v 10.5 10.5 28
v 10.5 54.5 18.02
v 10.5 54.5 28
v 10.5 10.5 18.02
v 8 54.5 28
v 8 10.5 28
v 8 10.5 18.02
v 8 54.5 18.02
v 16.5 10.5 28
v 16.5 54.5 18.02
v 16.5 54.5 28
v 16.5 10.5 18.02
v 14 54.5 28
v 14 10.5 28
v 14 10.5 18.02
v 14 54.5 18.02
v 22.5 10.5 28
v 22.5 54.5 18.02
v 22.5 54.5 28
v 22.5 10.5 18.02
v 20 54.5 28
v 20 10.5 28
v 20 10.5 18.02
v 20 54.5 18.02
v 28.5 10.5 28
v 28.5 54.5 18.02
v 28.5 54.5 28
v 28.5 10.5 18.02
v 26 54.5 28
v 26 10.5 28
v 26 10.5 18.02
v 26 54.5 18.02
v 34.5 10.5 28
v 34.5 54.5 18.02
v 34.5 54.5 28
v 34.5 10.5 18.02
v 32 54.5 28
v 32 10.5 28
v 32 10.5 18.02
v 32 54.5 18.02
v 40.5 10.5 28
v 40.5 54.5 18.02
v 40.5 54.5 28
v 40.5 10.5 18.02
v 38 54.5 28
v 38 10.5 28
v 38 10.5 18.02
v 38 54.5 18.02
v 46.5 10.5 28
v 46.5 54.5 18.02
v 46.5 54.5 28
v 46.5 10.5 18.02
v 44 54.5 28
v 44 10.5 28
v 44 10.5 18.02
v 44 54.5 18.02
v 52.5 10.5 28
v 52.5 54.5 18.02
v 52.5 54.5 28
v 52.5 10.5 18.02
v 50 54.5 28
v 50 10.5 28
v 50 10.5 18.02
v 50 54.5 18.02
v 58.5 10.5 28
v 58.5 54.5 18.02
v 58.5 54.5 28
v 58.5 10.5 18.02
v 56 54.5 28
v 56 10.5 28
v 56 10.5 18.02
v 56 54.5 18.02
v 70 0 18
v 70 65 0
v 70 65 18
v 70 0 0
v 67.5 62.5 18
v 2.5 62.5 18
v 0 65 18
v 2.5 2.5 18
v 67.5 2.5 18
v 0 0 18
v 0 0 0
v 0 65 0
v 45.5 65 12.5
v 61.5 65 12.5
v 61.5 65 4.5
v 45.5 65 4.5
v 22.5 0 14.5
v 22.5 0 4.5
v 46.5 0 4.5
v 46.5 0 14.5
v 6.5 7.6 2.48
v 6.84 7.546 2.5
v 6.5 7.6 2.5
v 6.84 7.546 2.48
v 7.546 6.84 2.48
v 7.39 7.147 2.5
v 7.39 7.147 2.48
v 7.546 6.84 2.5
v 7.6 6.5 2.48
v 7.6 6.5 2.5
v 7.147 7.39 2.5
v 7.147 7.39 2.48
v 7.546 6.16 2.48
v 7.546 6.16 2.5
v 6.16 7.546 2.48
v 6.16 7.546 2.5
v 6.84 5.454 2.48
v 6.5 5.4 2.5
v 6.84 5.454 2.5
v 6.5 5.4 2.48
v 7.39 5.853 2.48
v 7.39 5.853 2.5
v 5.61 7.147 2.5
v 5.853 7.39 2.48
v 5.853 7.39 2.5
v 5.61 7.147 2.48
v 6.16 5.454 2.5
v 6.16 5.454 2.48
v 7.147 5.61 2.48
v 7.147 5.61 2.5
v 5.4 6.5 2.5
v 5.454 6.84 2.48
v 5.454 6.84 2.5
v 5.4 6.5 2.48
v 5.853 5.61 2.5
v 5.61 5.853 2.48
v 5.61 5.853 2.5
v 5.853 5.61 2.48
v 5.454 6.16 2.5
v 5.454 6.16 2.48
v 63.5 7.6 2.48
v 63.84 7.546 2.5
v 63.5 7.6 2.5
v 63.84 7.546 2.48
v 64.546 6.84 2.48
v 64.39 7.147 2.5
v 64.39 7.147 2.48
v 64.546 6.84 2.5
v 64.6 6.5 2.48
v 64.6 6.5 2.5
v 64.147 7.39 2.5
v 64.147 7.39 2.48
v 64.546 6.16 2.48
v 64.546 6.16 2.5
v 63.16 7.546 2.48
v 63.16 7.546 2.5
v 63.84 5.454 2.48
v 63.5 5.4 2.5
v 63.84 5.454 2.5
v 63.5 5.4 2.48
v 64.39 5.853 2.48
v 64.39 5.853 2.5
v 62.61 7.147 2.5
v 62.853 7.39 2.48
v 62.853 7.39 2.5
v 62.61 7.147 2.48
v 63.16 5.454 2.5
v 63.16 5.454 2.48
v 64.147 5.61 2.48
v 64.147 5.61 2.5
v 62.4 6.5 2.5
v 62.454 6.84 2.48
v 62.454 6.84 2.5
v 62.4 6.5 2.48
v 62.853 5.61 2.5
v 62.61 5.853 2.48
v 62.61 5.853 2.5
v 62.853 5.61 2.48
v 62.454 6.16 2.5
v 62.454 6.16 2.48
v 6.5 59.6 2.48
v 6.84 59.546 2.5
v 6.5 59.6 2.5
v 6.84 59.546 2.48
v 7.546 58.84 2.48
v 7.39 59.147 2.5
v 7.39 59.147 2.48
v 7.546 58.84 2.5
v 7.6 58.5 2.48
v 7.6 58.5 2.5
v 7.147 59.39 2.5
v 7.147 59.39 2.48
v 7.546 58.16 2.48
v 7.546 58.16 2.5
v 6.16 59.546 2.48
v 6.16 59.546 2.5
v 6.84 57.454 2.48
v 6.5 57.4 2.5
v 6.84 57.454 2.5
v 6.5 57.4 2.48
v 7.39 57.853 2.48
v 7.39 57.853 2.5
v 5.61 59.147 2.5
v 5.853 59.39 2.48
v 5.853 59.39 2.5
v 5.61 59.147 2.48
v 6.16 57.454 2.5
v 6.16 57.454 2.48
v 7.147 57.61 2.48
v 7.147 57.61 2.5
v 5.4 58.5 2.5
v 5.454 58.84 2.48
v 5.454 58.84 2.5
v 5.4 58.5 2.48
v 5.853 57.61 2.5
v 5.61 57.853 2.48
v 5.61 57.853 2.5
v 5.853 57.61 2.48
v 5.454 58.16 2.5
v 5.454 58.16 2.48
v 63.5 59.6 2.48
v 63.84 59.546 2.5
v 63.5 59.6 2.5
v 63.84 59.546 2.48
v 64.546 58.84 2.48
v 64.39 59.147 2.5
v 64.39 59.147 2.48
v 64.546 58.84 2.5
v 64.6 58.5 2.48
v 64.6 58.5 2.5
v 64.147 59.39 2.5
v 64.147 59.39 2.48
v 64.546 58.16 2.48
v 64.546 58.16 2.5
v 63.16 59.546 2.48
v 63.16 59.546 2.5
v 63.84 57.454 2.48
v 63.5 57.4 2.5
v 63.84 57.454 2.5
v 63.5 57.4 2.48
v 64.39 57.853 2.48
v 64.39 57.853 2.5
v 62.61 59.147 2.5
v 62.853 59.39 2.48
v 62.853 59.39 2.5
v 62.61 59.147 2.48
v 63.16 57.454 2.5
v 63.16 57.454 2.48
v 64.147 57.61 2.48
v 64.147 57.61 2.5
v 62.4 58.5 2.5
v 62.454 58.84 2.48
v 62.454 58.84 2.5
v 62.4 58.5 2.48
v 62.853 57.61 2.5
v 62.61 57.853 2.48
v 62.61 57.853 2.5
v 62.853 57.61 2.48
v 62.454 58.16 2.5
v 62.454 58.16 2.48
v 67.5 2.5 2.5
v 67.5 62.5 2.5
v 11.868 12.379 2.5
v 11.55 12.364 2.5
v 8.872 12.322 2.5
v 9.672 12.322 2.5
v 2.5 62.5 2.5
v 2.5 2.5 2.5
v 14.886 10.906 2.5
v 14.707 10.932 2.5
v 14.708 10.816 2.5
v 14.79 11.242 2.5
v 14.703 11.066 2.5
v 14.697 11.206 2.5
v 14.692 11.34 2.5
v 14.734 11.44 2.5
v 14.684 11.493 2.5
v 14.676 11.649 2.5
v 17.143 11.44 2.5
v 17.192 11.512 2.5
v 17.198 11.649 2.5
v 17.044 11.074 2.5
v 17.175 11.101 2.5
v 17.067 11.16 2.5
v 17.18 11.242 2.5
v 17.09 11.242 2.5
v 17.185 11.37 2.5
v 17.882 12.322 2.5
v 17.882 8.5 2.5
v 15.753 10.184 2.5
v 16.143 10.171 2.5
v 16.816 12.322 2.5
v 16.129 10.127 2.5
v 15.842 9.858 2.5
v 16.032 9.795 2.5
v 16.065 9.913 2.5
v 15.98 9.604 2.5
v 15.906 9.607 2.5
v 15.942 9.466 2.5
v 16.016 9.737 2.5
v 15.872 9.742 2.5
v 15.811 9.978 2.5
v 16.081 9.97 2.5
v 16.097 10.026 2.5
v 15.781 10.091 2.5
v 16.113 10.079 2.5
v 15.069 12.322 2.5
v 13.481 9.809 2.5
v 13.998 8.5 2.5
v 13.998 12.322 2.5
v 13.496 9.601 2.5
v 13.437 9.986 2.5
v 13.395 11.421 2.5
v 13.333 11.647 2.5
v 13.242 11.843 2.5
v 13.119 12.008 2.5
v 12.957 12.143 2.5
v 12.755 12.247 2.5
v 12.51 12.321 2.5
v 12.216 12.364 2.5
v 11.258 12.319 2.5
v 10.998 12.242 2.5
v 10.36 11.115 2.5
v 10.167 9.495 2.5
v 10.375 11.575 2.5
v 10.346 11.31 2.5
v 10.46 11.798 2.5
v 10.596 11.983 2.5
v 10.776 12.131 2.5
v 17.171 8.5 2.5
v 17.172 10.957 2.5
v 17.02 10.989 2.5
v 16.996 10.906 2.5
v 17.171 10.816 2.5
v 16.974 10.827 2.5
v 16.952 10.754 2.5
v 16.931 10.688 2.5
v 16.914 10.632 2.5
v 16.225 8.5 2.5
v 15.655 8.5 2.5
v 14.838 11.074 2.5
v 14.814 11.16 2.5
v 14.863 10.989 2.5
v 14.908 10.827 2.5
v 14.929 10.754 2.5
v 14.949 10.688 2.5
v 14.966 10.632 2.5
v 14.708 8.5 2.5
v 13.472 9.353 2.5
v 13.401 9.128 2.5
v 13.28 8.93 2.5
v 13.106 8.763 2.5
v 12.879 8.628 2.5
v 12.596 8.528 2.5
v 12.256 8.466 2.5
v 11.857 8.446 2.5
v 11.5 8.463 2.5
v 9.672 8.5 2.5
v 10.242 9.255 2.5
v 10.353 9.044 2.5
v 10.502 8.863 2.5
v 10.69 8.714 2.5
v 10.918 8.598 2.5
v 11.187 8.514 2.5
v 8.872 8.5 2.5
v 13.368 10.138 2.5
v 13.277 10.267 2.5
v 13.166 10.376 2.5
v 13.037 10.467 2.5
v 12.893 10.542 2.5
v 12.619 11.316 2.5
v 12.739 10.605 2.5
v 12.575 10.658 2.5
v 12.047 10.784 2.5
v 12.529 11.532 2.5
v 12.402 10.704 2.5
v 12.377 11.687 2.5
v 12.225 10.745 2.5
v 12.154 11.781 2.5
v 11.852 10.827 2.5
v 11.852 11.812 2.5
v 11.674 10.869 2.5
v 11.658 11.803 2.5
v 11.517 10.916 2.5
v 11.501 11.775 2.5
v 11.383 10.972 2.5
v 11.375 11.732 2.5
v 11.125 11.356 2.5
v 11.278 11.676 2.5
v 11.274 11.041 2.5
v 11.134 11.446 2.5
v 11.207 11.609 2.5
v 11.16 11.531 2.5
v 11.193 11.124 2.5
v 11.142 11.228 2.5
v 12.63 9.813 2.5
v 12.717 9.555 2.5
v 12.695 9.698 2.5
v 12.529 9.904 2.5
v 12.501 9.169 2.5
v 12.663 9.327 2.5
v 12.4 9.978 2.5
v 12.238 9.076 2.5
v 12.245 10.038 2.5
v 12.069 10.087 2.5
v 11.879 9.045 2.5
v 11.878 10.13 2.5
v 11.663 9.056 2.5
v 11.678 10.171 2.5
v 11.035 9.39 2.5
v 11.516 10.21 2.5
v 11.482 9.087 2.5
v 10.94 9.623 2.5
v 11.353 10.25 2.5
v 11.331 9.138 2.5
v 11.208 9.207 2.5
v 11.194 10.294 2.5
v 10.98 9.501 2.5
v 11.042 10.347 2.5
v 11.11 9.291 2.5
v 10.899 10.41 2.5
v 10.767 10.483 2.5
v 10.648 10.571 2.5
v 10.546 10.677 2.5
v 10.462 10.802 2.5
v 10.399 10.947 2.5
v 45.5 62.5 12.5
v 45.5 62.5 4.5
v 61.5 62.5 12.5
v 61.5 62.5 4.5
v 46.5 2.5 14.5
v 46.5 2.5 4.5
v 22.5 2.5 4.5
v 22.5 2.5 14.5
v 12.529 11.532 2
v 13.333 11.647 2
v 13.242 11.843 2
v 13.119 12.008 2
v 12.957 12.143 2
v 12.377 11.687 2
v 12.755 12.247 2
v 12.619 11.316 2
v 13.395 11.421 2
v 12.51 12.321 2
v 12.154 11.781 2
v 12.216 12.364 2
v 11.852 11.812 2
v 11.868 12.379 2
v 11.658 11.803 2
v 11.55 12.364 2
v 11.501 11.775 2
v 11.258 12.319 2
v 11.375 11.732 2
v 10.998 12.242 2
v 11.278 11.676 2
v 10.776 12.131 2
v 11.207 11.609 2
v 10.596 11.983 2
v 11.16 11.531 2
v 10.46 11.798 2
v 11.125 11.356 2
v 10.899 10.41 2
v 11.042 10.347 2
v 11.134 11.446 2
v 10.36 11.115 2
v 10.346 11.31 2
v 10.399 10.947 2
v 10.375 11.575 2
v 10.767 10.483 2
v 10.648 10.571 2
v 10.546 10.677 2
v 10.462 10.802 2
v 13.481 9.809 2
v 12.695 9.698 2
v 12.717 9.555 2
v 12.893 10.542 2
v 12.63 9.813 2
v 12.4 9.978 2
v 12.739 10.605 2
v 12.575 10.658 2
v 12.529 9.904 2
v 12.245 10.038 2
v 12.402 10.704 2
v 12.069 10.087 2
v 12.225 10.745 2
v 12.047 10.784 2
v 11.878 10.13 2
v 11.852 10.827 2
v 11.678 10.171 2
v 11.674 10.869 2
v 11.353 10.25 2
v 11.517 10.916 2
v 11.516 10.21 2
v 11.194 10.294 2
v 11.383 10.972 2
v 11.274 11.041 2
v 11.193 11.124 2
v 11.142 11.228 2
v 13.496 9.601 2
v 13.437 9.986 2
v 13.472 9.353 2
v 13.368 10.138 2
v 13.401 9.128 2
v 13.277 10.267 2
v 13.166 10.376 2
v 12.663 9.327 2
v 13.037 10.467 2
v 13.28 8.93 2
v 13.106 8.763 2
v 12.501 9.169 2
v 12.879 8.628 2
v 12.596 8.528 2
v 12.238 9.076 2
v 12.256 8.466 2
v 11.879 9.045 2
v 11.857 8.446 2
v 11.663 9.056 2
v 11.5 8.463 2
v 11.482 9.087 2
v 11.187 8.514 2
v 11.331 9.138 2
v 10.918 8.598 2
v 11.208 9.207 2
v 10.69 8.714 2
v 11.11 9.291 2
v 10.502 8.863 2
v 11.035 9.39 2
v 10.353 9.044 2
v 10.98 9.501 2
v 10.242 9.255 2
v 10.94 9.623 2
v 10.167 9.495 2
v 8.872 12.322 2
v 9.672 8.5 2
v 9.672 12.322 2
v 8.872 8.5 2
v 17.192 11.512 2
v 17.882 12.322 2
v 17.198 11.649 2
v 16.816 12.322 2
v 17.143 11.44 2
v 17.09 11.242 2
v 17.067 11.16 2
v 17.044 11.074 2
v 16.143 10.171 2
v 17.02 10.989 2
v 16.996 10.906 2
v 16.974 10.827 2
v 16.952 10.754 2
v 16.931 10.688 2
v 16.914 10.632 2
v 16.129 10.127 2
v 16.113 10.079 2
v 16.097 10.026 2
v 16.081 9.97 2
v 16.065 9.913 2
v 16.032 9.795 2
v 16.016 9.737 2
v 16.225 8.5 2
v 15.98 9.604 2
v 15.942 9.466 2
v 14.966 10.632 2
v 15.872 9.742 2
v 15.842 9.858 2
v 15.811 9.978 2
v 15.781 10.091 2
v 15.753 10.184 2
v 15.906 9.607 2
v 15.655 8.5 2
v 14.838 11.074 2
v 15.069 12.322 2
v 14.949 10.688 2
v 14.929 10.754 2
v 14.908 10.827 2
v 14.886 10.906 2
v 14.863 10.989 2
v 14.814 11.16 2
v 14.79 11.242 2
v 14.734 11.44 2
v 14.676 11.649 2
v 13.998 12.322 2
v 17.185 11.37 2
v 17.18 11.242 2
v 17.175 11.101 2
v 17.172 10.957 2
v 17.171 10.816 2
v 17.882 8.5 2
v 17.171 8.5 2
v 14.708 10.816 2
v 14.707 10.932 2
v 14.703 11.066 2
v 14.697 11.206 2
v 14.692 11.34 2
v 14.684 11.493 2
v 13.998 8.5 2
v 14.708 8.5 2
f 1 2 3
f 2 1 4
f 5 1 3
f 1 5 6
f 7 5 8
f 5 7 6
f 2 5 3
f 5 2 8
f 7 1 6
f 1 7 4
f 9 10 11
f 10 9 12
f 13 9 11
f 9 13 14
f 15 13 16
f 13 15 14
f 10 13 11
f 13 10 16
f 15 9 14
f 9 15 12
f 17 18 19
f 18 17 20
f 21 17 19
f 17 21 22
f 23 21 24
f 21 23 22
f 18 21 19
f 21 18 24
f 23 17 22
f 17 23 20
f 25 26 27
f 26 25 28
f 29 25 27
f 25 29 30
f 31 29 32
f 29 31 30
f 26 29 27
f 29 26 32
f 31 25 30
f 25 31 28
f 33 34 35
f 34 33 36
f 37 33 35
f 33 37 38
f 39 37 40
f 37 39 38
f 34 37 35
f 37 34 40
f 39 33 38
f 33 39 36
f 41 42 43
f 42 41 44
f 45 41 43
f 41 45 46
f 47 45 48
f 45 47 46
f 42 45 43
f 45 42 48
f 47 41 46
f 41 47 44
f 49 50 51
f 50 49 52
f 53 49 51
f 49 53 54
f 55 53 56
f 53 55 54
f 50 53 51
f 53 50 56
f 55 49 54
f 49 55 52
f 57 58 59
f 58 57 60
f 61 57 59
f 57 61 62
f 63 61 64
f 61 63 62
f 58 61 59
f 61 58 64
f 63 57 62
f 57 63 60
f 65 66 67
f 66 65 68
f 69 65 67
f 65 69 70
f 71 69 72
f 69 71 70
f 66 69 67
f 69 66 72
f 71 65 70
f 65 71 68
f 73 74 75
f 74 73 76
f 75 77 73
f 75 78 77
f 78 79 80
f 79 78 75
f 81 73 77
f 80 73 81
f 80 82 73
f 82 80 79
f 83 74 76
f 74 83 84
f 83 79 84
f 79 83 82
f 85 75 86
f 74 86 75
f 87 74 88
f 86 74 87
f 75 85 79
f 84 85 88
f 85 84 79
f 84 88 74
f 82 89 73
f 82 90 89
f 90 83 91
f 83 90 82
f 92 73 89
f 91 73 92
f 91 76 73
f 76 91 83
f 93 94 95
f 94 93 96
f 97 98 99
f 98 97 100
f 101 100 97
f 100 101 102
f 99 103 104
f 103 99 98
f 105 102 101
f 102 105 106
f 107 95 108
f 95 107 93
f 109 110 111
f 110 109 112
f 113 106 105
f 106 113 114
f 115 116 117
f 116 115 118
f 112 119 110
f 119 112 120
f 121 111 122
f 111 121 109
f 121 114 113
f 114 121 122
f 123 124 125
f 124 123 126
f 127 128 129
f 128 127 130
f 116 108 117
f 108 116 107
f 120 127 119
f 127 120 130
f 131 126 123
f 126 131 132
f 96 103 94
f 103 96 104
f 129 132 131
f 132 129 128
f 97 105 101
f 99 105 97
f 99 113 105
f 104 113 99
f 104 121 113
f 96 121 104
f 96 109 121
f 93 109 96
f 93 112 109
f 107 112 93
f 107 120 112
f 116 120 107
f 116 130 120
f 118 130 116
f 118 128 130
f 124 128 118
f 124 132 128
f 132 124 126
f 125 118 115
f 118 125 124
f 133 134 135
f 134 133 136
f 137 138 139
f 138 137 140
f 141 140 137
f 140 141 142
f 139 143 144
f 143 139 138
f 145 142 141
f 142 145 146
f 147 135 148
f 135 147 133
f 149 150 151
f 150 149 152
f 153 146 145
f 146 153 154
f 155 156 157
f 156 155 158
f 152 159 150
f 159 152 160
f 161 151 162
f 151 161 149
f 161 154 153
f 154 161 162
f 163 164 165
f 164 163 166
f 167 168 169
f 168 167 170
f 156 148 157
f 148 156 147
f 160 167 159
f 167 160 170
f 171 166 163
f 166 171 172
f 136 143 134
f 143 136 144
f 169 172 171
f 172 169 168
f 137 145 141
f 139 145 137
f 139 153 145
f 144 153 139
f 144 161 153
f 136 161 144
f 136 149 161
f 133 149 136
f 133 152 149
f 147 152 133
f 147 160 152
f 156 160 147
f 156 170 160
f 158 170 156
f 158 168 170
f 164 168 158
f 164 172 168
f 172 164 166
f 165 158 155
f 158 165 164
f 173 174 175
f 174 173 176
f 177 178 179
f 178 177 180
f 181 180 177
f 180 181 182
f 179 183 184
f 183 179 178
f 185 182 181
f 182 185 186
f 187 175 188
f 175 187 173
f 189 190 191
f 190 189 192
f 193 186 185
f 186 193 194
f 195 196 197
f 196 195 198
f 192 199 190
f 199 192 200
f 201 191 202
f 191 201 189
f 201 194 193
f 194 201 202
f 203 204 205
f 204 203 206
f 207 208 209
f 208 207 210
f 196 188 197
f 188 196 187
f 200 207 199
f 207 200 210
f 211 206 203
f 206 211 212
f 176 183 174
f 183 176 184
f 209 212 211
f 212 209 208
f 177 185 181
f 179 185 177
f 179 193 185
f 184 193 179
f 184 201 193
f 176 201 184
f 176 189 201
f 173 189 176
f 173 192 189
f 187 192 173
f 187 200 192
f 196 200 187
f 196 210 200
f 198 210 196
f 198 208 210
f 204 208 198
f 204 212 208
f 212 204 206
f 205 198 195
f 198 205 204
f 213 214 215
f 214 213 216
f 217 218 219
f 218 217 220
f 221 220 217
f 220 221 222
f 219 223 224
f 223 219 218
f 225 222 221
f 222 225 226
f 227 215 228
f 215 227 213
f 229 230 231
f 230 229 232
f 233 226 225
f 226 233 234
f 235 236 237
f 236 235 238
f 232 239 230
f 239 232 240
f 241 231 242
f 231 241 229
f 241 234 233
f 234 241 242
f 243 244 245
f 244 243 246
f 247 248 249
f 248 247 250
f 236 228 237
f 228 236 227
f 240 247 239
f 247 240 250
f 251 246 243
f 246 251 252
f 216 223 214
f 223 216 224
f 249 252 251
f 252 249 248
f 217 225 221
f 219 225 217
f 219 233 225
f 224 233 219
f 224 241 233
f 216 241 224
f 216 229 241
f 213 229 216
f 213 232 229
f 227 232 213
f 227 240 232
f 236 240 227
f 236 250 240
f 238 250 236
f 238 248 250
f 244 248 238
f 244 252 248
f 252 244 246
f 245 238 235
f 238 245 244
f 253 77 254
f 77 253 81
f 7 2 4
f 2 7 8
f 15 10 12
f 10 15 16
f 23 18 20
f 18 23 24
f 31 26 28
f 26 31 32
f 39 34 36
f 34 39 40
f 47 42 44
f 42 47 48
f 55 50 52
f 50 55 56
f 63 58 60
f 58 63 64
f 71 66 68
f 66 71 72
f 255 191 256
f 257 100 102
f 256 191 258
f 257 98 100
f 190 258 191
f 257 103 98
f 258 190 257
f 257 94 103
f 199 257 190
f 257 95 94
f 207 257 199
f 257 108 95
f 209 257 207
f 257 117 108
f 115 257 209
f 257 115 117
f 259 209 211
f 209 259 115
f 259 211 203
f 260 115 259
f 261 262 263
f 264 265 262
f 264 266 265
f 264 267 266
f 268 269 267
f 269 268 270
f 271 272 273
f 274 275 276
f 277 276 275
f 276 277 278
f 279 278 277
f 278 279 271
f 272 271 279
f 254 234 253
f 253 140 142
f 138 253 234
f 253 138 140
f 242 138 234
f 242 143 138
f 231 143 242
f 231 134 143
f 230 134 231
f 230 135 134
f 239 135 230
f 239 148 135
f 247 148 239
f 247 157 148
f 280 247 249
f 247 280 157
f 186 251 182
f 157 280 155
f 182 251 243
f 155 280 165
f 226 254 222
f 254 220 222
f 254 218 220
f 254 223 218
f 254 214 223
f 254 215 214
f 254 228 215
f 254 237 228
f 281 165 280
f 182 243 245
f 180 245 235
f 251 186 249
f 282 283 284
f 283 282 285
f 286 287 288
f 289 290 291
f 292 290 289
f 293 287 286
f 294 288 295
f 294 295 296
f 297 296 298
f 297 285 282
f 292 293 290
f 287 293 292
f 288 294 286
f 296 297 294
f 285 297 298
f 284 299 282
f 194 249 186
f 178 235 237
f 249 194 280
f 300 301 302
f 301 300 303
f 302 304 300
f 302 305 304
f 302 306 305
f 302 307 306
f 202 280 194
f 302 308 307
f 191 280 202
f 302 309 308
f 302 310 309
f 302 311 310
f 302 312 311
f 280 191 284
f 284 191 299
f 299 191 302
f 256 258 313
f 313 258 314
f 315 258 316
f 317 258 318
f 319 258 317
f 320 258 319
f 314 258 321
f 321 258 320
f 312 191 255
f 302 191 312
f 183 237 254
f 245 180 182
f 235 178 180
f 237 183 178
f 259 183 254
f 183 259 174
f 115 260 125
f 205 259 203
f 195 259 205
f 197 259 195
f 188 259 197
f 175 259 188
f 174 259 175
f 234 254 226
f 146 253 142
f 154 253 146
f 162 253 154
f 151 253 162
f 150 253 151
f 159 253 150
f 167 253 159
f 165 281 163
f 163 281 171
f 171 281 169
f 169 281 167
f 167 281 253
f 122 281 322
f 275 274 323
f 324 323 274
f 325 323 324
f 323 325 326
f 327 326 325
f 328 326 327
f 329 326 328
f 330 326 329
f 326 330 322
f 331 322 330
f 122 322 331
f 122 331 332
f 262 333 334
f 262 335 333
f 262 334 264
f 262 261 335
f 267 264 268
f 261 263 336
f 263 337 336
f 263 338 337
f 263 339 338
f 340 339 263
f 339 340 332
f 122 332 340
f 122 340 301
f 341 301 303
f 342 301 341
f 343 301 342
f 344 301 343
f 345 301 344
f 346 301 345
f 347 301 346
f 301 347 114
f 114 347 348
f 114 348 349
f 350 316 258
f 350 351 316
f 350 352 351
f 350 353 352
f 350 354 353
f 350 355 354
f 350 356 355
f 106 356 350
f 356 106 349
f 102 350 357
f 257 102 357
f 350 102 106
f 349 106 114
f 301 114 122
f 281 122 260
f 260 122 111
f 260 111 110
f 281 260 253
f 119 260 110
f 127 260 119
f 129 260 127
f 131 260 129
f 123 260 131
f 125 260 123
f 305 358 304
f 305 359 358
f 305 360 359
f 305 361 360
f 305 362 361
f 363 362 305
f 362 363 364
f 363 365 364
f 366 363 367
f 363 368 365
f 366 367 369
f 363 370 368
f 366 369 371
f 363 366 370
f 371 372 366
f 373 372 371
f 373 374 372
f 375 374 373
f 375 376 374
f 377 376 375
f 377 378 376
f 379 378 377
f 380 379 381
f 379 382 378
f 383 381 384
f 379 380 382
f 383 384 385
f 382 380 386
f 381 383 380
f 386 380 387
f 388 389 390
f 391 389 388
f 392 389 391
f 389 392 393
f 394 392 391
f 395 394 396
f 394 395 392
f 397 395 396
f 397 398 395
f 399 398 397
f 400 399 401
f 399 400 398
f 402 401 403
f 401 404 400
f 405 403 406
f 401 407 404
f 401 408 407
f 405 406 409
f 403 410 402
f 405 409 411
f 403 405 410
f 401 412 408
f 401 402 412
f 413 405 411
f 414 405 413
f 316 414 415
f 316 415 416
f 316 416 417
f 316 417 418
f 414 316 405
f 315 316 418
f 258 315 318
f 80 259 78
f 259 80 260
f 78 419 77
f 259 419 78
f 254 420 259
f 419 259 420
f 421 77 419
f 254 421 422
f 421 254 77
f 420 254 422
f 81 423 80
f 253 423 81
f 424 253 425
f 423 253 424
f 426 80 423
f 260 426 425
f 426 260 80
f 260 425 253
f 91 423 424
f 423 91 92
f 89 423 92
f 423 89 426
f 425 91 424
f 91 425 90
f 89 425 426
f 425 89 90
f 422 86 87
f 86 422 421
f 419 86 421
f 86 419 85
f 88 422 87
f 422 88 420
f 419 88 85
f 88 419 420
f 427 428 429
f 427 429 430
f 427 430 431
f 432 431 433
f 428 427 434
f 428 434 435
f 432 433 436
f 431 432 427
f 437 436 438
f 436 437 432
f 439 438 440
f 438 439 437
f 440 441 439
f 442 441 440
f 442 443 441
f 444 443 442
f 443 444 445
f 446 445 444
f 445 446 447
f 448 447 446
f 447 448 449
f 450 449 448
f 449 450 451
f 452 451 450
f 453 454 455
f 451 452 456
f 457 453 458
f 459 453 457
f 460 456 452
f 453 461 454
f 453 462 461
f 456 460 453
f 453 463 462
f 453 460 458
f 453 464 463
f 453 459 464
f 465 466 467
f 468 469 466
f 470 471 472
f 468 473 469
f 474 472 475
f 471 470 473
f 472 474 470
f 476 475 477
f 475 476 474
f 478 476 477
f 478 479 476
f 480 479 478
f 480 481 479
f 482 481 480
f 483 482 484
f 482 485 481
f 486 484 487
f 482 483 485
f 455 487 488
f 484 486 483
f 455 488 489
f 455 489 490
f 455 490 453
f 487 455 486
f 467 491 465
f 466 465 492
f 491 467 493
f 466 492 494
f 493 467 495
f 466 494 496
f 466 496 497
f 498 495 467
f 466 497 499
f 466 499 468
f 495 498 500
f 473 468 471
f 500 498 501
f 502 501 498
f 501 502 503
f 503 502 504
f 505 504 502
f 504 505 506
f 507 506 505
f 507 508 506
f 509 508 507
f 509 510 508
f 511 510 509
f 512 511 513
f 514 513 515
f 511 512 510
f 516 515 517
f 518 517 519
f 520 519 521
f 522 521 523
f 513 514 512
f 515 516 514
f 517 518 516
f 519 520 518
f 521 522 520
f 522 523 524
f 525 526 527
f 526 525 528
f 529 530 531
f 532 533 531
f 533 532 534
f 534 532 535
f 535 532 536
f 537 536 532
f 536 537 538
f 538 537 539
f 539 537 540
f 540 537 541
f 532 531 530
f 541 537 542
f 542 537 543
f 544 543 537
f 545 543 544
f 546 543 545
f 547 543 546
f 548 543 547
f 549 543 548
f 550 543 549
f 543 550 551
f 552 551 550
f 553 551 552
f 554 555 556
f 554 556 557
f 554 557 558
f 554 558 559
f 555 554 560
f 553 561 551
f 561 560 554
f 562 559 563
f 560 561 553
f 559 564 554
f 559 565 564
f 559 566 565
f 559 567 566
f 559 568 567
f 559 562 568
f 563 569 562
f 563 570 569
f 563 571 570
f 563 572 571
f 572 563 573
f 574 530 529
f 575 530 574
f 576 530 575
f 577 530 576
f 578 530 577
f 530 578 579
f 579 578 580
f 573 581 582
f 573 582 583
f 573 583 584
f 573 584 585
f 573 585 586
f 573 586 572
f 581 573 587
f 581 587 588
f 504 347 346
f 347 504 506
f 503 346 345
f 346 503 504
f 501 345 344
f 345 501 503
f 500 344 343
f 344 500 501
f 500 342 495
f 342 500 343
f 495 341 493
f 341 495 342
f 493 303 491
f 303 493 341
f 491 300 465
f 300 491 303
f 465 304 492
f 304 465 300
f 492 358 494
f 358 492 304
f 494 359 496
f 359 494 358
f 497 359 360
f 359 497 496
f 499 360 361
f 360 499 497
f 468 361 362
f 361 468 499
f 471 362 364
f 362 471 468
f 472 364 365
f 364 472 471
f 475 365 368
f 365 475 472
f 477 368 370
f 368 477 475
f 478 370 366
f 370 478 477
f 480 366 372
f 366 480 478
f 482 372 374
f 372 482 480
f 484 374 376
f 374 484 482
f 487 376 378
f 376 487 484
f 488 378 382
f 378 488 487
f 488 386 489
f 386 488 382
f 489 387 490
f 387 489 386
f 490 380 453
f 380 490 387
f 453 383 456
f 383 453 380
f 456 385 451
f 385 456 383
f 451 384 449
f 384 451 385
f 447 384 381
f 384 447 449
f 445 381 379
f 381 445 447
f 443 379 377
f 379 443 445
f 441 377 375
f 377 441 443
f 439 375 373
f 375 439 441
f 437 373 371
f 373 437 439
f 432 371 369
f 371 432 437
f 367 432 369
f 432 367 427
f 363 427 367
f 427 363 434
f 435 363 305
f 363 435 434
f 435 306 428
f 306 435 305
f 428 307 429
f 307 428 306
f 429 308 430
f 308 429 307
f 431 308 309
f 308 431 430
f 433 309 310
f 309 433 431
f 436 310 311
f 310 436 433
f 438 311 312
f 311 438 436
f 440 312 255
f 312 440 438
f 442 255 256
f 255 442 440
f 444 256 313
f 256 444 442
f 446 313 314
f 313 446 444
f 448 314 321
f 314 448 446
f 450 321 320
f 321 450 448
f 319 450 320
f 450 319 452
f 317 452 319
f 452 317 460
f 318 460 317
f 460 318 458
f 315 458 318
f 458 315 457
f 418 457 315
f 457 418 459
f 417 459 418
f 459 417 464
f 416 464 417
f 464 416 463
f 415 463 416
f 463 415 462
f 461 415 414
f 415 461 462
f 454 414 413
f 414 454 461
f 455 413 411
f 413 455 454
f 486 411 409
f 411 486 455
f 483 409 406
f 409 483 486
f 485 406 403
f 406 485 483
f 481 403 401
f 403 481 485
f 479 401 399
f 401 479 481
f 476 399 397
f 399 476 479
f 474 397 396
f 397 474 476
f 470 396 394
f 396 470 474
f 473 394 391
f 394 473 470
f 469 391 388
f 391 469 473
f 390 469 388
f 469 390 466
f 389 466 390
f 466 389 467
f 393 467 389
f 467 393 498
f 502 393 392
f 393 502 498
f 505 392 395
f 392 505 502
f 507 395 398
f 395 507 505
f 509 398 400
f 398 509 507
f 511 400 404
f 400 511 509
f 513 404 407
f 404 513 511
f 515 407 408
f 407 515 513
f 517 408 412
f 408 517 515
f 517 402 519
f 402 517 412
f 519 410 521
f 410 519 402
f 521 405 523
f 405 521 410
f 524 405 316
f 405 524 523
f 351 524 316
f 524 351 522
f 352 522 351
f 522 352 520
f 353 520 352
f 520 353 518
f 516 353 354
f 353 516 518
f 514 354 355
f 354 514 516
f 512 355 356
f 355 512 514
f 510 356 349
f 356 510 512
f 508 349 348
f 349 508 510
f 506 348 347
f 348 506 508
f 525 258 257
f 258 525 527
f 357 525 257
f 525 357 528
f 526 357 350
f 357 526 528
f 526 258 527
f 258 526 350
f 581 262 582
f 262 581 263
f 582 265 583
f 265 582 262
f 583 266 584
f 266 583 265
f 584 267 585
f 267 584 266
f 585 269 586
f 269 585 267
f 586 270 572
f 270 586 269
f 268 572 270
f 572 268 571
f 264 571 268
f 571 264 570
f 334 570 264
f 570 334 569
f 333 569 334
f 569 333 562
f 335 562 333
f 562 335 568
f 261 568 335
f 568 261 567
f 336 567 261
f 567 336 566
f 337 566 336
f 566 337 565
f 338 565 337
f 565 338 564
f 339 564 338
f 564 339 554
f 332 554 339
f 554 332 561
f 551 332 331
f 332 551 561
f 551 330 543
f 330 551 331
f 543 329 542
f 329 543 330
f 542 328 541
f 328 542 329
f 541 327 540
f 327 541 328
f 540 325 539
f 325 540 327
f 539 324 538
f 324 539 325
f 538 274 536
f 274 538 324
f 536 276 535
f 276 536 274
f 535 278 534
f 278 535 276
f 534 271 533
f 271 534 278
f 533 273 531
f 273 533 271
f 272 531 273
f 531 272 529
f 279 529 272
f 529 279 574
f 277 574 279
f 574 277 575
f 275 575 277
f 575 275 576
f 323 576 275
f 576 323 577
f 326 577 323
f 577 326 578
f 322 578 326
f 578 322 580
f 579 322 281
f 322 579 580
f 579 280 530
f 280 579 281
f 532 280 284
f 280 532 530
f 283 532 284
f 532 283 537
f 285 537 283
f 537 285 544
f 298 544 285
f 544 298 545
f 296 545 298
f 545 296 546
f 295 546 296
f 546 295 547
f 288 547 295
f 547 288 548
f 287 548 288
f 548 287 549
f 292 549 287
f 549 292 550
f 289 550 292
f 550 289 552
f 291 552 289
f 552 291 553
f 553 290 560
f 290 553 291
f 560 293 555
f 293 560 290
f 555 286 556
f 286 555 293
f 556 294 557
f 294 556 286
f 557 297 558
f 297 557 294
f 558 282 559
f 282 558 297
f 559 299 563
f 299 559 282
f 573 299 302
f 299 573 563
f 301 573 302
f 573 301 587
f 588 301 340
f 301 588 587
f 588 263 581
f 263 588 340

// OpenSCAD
// ISM CPU module heatsink shroud (original ISM)
// Manifold-safe: bosses unioned into shell, holes cut in one difference().
pcb_w = 65;
pcb_d = 60;
wall = 2.5;
shroud_h = 18;
fin_h = 10;
eps = 0.02;
mount_d = 2.2;
badge_depth = 0.5;

mounts = [[4, 4], [pcb_w - 4, 4], [4, pcb_d - 4], [pcb_w - 4, pcb_d - 4]];

module shroud() {
  difference() {
    union() {
      cube([pcb_w + 2 * wall, pcb_d + 2 * wall, shroud_h]);
      // Cooling fins on top
      for (x = [8 : 6 : pcb_w - 4])
        translate([x, wall + 8, shroud_h - eps])
          cube([2.5, pcb_d - 16, fin_h + eps]);
      for (p = mounts)
        translate([p[0] + wall, p[1] + wall, wall - eps])
          cylinder(h = 5 + eps, d = 6, $fn = 24);
    }
    translate([wall, wall, wall])
      cube([pcb_w, pcb_d, shroud_h - wall + eps]);
    // Header clearance (top edge of board / J1)
    translate([wall + 20, -eps, wall + 2])
      cube([24, wall + 4, 10]);
    // USB-C cutout
    translate([wall + pcb_w - 22, wall + pcb_d - 2, wall + 2])
      cube([16, wall + 4, 8]);
    for (p = mounts)
      translate([p[0] + wall, p[1] + wall, wall - eps])
        cylinder(h = 8 + 2 * eps, d = mount_d, $fn = 20);
    translate([wall + 6, wall + 6, wall - badge_depth])
      linear_extrude(height = badge_depth + eps)
        text("ISM", size = 4, font = "Liberation Sans:style=Bold");
  }
}

module base_plate() {
  difference() {
    cube([pcb_w + 2 * wall, pcb_d + 2 * wall, wall]);
    for (p = mounts)
      translate([p[0] + wall, p[1] + wall, -eps])
        cylinder(h = wall + 2 * eps, d = mount_d, $fn = 20);
    translate([wall + 20, wall + 2, -eps])
      cube([24, 8, wall + 2 * eps]);
  }
}

shroud();
